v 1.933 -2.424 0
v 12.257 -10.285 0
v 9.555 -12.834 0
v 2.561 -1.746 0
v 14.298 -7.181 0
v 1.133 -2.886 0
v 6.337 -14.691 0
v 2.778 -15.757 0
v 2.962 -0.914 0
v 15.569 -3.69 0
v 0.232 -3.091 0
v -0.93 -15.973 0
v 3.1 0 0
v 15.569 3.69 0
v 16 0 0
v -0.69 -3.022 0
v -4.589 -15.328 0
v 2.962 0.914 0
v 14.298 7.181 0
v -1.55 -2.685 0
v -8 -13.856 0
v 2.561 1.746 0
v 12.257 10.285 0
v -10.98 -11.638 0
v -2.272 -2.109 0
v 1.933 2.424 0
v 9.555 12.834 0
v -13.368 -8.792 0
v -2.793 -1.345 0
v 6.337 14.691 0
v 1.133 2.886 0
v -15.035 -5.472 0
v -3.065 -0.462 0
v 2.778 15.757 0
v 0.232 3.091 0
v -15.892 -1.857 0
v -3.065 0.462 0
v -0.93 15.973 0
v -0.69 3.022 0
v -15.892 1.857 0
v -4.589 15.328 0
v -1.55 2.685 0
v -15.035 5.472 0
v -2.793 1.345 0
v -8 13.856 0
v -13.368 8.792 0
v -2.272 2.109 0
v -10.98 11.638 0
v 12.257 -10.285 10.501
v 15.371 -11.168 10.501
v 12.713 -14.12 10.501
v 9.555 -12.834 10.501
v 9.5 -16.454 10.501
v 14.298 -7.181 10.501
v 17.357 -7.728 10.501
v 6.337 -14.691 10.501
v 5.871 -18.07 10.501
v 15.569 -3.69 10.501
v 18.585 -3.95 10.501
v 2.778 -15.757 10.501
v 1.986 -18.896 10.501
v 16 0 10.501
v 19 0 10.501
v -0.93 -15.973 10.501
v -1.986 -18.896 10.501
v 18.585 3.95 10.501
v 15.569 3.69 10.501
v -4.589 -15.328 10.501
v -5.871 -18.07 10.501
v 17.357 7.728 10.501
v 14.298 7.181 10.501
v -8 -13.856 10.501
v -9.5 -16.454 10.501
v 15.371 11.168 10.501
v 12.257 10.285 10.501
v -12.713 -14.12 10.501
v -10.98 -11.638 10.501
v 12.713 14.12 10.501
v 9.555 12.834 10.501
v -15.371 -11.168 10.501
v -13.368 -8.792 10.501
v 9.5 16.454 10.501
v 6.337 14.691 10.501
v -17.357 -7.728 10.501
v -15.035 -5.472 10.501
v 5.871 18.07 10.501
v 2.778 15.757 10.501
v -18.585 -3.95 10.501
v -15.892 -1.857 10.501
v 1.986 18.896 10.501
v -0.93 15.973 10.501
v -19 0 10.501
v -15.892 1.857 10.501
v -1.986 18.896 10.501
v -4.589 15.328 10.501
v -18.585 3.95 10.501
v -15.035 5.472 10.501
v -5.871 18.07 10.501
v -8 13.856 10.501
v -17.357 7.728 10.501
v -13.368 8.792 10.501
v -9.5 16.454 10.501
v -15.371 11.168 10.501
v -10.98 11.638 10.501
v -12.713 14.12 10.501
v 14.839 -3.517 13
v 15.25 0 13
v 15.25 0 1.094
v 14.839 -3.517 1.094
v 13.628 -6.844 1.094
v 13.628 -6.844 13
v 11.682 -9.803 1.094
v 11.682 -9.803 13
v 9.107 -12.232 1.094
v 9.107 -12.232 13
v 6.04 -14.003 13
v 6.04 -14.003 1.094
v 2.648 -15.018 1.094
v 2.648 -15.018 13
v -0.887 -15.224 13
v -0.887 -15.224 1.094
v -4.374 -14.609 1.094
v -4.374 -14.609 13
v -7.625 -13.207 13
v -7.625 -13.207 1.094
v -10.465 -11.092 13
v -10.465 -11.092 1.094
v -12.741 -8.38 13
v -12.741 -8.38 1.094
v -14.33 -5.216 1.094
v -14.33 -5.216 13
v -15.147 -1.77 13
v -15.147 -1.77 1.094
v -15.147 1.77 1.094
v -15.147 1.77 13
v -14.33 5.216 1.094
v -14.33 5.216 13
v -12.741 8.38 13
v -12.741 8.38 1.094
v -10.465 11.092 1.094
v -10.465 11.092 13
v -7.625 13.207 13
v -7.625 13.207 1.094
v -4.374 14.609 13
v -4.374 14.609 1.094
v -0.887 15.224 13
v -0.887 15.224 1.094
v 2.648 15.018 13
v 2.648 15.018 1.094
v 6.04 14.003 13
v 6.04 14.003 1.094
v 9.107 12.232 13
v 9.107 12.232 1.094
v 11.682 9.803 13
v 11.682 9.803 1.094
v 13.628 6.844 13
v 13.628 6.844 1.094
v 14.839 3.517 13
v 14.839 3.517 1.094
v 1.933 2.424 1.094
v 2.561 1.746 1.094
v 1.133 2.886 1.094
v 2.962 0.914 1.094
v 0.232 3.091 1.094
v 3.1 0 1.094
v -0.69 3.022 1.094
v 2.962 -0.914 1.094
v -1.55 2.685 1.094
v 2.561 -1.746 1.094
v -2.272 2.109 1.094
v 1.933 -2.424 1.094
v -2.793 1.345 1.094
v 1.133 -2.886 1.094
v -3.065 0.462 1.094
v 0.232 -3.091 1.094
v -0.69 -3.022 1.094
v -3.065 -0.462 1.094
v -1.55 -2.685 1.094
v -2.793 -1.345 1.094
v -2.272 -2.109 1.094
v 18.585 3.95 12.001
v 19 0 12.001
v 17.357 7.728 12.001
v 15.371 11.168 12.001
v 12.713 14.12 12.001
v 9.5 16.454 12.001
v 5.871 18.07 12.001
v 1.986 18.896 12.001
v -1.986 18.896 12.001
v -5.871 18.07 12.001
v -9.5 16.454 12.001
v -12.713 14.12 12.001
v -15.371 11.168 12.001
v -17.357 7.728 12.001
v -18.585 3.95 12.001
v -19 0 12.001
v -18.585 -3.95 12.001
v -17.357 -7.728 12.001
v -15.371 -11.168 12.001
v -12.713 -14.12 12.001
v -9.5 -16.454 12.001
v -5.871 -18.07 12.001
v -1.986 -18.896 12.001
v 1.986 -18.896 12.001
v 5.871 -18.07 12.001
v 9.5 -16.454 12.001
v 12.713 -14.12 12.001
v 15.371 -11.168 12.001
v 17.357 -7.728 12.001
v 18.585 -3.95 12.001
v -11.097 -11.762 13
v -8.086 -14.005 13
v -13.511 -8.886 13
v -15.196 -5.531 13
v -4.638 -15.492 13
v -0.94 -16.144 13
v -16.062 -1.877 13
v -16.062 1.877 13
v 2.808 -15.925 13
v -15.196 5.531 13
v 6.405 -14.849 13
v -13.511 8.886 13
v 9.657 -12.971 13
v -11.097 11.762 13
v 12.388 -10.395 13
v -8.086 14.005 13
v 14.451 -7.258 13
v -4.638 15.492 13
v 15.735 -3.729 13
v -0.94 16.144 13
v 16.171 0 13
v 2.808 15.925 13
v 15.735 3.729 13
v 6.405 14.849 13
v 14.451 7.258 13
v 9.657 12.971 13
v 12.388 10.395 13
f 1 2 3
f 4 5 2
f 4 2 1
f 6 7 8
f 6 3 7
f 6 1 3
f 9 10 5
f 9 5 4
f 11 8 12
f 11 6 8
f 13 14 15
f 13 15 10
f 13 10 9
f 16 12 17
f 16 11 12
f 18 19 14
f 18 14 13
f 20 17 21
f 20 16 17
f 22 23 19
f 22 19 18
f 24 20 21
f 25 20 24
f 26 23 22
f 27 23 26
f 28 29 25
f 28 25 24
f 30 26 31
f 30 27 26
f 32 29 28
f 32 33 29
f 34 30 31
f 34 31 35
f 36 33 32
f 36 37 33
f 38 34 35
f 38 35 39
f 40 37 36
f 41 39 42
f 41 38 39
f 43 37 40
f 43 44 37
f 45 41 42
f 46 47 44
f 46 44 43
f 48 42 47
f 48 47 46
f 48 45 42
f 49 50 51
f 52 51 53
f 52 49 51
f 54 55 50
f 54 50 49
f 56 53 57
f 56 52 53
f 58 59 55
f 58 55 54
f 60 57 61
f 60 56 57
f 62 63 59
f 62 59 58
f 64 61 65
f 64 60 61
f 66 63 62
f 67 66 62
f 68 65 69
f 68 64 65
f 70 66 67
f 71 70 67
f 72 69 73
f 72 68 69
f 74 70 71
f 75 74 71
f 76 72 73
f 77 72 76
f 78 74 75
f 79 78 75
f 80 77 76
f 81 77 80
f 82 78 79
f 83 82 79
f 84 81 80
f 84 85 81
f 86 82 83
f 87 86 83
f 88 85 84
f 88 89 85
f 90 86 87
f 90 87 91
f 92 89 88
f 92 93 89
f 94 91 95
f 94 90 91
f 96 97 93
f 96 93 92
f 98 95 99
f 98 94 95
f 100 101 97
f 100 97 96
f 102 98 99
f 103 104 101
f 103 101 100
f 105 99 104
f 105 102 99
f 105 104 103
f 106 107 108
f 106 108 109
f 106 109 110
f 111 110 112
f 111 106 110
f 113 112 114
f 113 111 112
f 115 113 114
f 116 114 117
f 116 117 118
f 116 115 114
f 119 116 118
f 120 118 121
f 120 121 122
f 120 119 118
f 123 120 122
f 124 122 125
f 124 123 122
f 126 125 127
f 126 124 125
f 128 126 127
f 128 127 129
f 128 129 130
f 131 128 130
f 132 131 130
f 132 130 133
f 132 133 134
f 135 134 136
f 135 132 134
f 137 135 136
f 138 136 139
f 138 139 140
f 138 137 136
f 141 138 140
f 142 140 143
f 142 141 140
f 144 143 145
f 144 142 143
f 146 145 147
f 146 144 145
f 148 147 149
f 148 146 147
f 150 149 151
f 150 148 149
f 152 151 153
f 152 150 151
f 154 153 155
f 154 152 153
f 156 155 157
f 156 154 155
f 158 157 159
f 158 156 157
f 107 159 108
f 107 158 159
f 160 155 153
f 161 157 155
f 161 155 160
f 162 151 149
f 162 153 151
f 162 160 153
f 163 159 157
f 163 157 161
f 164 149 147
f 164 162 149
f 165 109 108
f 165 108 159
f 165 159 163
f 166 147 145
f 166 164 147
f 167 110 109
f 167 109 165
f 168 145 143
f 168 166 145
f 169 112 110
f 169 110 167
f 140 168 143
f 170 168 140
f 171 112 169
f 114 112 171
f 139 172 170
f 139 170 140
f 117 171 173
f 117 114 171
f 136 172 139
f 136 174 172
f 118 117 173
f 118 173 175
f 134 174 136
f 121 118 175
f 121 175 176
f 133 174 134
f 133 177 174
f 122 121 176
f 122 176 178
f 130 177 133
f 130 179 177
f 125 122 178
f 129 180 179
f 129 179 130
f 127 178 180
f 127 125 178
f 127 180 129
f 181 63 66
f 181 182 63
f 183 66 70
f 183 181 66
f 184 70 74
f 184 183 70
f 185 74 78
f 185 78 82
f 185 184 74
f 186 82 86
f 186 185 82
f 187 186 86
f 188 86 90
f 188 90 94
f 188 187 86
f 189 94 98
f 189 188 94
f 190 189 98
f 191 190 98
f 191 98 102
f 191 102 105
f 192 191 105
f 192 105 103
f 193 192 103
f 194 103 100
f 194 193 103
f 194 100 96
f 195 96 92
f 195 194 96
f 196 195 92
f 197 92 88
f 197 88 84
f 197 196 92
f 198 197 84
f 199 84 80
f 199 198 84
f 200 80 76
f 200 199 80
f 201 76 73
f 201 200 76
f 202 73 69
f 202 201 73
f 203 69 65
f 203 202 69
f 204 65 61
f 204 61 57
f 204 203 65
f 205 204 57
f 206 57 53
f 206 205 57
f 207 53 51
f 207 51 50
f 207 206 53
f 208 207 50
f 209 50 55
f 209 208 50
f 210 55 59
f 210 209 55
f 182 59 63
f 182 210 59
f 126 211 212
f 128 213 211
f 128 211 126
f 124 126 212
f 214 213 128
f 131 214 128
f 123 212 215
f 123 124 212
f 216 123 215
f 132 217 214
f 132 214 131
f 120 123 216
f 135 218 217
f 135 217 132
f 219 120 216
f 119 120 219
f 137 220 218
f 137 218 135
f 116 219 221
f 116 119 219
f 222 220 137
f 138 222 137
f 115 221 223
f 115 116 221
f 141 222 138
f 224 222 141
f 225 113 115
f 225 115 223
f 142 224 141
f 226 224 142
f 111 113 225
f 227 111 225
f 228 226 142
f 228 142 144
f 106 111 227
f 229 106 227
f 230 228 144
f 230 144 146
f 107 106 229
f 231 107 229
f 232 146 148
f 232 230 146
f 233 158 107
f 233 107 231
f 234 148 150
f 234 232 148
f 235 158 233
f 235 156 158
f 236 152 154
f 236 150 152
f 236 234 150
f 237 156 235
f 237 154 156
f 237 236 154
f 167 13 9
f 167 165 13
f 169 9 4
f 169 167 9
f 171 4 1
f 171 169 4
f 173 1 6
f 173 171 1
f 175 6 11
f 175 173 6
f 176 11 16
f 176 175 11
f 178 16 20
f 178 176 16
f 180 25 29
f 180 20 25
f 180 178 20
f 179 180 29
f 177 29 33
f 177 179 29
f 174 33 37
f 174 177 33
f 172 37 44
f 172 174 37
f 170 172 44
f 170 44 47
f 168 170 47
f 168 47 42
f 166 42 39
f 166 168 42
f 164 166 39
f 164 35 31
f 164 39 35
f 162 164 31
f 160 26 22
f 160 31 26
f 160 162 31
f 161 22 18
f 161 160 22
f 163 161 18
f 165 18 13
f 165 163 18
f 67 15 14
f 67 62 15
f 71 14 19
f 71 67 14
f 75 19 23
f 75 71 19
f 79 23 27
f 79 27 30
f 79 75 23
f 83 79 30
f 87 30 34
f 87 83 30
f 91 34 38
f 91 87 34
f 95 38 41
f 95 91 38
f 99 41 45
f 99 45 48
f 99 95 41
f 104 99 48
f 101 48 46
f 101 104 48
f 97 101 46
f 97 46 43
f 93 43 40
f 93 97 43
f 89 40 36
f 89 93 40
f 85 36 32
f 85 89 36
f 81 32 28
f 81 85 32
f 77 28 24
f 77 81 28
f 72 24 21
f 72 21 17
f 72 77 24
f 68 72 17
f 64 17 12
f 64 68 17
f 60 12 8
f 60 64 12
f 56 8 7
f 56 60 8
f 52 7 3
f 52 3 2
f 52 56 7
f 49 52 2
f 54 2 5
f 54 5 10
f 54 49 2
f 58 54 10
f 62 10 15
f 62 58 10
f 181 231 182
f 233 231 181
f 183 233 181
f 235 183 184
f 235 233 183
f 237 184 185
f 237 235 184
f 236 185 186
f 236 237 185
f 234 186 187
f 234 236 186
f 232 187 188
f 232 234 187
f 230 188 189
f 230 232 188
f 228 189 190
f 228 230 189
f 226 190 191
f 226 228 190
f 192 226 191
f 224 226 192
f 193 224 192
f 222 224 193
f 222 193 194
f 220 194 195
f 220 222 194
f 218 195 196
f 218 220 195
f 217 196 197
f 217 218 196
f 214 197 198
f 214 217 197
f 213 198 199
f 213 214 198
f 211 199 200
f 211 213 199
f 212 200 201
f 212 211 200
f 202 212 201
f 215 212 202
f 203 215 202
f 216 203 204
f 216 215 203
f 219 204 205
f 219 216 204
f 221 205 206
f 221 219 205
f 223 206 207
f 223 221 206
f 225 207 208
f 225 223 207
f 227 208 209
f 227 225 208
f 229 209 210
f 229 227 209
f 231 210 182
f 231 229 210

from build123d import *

# Parameters (mm, degrees)
F2_W = 15.25
F2_H = 13
F5_W = 3.1
F5_H = 4.190033


with BuildPart() as f1:
    # F0 (on Front) → F1 (revolve)
    with BuildSketch(Plane.XZ):
        Polygon((16.171061, 13), (0, 13), (0, 0), (16, 0), (16, 10.501449), (19, 10.501449), (19, 12.001449), align=None)
    revolve(axis=Axis((0, 0, 6.5), (0, 0, 1)))


with BuildPart() as f3:
    # F2 (on Front) → F3 (revolve)
    with BuildSketch(Plane.XZ):
        with Locations((7.625, 7.594327)):
            Rectangle(F2_W, F2_H)
    revolve(axis=Axis((0, 0, 7.594327), (0, 0, -1)))


with BuildPart() as f1_1:
    add(f1.part)

    # F4: cut F3
    add(f3.part, mode=Mode.SUBTRACT)


with BuildPart() as f6:
    # F5 (on Front) → F6 (revolve)
    with BuildSketch(Plane.XZ):
        with Locations((1.55, 1.039109)):
            Rectangle(F5_W, F5_H)
    revolve(axis=Axis((0, 0, 1.03911), (0, 0, -1)))


with BuildPart() as f1_2:
    add(f1_1.part)

    # F7: cut F6
    add(f6.part, mode=Mode.SUBTRACT)


solid = f1_2.part
